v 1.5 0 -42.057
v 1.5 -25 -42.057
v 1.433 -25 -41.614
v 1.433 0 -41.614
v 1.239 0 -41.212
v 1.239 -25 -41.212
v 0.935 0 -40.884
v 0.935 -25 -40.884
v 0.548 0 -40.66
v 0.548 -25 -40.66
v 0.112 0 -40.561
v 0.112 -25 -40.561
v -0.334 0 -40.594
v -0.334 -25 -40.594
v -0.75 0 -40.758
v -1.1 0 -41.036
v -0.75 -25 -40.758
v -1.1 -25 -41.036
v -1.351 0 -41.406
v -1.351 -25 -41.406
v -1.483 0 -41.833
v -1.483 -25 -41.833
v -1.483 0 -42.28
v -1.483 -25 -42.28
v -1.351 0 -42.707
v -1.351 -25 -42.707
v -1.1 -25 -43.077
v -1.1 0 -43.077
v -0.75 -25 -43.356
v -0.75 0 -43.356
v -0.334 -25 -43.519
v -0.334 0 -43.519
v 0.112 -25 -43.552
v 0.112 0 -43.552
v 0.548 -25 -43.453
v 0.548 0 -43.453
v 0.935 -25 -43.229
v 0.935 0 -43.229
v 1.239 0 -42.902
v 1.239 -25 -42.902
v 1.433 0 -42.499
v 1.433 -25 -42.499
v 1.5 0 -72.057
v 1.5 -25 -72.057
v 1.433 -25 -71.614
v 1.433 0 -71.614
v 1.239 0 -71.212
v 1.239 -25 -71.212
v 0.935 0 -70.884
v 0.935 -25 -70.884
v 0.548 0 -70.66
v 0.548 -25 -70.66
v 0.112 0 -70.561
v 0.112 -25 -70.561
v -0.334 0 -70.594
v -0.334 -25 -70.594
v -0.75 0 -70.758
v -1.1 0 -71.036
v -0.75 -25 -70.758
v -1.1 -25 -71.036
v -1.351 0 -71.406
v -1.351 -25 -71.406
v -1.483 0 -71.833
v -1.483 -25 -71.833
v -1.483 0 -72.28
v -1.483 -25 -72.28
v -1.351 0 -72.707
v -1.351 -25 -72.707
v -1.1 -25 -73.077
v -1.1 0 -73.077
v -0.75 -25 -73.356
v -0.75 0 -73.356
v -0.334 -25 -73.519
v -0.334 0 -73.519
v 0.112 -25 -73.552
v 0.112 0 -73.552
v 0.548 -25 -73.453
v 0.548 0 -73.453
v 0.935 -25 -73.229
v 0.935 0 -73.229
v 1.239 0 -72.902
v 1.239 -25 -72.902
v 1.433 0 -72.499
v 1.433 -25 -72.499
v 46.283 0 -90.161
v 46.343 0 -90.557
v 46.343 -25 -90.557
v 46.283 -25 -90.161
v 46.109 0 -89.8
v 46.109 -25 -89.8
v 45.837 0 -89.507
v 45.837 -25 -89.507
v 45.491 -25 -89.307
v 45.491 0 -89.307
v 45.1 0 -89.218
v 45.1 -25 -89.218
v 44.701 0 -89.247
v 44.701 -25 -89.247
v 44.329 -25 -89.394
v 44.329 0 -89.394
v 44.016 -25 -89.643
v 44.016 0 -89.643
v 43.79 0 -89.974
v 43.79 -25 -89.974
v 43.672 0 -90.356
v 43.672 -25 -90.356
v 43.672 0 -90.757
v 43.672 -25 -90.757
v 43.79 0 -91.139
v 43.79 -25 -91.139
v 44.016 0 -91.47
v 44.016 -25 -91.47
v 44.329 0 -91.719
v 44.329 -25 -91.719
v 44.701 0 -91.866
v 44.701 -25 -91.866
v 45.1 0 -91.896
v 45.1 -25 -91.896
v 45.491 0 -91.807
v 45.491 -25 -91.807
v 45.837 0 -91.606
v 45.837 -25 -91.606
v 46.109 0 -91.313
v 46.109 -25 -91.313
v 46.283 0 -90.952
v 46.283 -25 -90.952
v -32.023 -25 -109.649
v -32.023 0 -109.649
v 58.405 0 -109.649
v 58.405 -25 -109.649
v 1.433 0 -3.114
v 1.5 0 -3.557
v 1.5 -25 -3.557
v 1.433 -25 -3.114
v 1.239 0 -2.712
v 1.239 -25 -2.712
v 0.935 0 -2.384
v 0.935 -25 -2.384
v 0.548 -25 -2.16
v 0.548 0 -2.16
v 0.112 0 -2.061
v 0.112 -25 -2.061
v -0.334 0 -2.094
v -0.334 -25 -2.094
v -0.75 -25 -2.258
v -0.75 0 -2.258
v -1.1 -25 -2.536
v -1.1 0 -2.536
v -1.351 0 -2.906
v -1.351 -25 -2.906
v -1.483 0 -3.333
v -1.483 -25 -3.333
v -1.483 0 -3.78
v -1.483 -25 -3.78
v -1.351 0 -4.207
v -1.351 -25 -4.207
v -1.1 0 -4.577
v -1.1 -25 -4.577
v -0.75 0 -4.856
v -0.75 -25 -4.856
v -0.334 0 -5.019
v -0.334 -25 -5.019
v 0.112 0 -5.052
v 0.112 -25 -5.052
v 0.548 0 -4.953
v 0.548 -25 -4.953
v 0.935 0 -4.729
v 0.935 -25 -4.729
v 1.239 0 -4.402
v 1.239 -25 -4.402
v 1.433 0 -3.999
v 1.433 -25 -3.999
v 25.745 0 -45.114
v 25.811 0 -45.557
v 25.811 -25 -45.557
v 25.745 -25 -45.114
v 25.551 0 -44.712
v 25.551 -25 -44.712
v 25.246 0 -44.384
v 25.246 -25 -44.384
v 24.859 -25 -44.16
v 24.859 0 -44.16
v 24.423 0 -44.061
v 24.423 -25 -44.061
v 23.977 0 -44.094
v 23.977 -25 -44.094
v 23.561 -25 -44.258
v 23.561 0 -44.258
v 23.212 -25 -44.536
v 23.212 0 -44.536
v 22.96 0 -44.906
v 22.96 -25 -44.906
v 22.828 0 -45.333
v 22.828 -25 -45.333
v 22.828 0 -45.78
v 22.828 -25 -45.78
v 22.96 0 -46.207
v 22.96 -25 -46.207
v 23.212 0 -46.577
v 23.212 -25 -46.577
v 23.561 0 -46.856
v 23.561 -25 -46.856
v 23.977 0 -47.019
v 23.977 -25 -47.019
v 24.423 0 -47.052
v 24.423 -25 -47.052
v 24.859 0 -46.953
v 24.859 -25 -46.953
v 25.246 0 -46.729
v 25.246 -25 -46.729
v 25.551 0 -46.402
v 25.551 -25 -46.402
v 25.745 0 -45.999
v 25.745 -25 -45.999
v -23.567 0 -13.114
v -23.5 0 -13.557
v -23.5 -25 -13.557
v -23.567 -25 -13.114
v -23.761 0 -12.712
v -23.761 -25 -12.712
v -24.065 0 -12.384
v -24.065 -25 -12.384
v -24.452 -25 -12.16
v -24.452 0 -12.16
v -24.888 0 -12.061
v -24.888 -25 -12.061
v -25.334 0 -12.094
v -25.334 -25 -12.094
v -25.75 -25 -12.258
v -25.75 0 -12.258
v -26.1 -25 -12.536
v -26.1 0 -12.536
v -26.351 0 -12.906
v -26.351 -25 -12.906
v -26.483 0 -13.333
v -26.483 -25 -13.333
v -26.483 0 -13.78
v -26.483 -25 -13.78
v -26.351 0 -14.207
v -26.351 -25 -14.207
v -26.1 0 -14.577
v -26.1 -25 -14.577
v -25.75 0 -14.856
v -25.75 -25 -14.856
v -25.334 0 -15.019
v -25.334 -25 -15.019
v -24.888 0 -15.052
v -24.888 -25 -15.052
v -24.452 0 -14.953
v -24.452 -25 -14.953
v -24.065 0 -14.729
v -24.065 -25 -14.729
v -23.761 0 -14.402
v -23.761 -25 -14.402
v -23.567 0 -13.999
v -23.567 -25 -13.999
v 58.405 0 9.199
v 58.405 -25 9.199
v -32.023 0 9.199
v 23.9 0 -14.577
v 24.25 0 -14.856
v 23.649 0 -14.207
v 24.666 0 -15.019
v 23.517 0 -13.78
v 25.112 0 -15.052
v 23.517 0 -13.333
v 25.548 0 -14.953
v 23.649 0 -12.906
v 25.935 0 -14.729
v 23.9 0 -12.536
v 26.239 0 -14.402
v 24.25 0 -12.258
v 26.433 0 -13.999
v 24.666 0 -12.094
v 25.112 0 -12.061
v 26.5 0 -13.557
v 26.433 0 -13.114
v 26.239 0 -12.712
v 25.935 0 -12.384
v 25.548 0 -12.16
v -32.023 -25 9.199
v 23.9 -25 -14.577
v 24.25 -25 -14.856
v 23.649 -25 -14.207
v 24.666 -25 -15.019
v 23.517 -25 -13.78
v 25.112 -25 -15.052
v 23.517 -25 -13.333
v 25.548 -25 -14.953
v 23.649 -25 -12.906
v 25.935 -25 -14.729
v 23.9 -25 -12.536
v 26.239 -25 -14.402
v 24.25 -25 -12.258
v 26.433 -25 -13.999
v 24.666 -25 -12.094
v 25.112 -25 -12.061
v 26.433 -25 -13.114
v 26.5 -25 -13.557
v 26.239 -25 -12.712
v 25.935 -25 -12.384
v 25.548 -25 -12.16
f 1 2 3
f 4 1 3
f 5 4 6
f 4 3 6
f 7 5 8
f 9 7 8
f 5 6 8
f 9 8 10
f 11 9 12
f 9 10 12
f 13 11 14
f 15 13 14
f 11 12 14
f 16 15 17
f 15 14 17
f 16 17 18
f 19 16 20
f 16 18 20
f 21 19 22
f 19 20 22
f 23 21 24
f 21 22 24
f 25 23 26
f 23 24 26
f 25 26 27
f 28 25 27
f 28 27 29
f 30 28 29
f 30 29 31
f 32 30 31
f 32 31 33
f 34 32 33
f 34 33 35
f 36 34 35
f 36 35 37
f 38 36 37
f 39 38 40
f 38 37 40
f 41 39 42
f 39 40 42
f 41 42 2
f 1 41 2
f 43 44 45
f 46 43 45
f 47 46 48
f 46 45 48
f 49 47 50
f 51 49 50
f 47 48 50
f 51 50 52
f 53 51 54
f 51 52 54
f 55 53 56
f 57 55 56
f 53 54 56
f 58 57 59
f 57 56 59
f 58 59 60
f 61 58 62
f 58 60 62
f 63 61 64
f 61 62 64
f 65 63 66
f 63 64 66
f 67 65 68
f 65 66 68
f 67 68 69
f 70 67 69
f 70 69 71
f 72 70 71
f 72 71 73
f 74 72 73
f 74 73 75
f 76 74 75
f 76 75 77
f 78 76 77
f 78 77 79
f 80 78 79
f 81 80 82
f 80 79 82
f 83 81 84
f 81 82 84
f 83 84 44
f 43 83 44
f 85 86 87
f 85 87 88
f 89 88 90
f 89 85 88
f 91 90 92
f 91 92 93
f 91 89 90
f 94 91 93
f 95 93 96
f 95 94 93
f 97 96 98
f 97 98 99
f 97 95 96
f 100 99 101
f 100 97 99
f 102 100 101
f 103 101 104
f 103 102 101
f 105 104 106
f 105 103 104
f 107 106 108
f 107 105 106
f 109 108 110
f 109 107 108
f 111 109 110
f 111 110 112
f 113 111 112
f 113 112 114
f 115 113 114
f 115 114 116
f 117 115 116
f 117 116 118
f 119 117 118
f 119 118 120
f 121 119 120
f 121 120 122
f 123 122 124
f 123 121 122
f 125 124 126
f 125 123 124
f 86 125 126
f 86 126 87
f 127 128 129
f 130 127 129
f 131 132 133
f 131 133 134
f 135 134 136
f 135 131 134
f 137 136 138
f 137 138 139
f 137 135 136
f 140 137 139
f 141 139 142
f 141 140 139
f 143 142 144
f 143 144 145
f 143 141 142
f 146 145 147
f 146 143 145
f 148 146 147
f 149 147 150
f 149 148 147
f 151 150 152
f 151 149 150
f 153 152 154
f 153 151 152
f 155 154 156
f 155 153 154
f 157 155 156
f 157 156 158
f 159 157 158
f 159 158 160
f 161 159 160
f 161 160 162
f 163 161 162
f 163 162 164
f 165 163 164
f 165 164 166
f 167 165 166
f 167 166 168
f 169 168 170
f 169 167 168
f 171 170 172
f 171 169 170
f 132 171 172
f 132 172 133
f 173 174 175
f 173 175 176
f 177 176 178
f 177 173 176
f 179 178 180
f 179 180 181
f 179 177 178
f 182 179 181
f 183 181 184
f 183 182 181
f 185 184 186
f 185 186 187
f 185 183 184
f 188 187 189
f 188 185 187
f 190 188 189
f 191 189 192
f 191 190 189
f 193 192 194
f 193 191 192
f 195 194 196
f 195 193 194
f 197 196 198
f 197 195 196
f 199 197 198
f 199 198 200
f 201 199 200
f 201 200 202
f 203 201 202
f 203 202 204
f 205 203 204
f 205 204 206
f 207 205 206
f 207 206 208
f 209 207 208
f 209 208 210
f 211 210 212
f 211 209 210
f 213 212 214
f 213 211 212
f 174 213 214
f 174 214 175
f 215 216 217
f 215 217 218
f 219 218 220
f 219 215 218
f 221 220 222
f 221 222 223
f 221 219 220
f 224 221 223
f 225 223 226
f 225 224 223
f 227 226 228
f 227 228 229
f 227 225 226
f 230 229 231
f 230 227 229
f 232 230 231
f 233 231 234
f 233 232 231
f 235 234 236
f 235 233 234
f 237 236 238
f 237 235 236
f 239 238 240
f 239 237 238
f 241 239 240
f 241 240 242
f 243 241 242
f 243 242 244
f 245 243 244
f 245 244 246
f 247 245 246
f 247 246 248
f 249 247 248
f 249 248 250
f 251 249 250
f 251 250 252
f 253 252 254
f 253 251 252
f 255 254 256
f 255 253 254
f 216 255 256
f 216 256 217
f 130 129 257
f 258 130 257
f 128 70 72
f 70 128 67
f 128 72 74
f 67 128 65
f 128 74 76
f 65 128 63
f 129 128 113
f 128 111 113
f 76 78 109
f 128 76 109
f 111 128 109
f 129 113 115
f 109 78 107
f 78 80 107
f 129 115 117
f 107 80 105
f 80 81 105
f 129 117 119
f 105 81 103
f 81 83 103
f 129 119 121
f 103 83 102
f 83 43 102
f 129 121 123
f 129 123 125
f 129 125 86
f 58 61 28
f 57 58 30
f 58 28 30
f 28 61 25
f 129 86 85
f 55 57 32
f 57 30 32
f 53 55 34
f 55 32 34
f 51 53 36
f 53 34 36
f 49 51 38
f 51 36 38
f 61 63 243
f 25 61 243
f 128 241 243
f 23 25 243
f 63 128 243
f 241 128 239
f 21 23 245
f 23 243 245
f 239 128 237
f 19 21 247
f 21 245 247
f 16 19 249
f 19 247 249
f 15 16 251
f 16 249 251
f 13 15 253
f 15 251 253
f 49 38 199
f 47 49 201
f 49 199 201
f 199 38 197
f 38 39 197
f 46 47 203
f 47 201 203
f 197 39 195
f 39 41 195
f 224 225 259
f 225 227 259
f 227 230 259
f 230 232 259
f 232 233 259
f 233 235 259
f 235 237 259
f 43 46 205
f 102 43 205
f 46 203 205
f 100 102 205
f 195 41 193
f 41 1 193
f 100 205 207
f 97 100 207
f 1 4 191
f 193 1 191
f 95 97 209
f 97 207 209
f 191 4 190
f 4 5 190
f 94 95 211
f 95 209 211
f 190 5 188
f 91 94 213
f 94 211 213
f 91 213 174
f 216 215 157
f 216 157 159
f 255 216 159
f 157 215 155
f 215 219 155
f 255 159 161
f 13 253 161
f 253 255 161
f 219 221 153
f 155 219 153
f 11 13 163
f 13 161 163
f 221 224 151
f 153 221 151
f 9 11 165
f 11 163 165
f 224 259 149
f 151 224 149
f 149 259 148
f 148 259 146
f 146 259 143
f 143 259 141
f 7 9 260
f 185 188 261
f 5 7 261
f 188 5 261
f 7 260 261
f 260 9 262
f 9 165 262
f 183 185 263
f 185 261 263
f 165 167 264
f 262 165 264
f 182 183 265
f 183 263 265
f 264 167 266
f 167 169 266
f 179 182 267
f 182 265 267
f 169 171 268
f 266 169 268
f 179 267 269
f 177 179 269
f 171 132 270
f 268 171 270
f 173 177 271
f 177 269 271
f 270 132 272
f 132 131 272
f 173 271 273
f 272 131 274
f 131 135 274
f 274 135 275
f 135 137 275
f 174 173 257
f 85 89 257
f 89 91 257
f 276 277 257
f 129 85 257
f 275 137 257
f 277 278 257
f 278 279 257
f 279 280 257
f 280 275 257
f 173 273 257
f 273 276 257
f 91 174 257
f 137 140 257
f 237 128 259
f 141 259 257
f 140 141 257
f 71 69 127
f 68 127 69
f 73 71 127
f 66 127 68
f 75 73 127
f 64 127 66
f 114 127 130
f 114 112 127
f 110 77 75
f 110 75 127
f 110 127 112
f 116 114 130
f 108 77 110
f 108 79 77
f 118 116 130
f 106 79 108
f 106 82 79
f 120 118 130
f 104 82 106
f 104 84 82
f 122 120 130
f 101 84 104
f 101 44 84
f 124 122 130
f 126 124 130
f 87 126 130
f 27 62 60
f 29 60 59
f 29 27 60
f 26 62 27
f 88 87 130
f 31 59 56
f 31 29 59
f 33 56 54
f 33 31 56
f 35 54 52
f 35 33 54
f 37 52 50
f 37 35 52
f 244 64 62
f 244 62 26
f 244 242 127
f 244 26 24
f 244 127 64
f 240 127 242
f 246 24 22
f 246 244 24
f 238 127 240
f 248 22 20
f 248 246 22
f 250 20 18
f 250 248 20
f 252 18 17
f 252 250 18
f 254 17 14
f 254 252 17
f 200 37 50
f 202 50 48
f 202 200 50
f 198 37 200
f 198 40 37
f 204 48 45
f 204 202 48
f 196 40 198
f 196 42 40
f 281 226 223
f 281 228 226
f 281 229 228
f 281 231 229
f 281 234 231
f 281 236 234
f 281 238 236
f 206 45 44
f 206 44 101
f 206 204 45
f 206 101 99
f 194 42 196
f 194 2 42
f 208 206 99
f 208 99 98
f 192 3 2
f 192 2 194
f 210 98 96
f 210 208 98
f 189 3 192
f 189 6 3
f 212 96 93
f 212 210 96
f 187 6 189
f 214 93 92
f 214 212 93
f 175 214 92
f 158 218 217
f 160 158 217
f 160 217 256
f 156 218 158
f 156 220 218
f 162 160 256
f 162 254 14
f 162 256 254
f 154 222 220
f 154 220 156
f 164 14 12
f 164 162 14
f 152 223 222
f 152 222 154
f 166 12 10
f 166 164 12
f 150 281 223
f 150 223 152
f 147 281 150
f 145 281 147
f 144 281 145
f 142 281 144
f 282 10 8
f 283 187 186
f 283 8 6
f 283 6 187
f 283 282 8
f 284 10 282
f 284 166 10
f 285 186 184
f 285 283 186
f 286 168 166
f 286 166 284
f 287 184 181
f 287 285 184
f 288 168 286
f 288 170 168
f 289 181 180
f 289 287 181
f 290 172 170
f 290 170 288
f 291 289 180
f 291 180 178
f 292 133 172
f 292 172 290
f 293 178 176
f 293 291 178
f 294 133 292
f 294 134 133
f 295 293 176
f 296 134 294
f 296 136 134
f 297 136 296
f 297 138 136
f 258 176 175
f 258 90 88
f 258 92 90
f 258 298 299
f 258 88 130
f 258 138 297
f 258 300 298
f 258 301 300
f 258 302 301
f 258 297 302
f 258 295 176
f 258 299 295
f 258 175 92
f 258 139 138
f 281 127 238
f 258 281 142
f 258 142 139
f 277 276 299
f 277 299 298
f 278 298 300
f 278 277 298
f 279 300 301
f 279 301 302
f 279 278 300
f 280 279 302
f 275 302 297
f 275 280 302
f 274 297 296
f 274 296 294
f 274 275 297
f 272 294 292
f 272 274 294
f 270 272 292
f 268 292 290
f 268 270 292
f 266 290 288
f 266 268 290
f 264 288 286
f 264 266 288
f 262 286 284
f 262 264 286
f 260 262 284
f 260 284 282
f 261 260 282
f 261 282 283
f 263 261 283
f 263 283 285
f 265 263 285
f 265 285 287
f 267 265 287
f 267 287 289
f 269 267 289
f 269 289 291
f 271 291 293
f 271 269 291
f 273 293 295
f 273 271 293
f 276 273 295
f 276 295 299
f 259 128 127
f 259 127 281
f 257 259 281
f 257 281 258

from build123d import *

# Parameters (mm, degrees)
F0_W     = 90.427961
F0_H     = 118.848171
F0_R     = 1.342773
F0_R_2   = 1.5
F1_DEPTH = 25
F2_R     = 1.5
F3_DEPTH = 25


with BuildPart() as f1:
    # F0 (on Front) → F1 (new body)
    with BuildSketch(Plane.XZ):
        with Locations((13.190647, -50.225)):
            Rectangle(F0_W, F0_H)
        with Locations((45, -90.556594)):
            Circle(F0_R, mode=Mode.SUBTRACT)
        with Locations((-25, -13.556594)):
            Circle(F0_R_2, mode=Mode.SUBTRACT)
        with Locations((0, -3.556594)):
            Circle(F0_R_2, mode=Mode.SUBTRACT)
        with Locations((24.3112, -45.556594)):
            Circle(F0_R_2, mode=Mode.SUBTRACT)
        with Locations((25, -13.556594)):
            Circle(F0_R_2, mode=Mode.SUBTRACT)
    extrude(amount=F1_DEPTH)

    # F2 (on face) → F3 (cut)
    with BuildSketch(Plane.XZ.offset(25)):
        with Locations((0, -42.056594)):
            Circle(F2_R)
        with Locations((0, -72.056594)):
            Circle(F2_R)
    extrude(amount=-F3_DEPTH, mode=Mode.SUBTRACT)


solid = f1.part
